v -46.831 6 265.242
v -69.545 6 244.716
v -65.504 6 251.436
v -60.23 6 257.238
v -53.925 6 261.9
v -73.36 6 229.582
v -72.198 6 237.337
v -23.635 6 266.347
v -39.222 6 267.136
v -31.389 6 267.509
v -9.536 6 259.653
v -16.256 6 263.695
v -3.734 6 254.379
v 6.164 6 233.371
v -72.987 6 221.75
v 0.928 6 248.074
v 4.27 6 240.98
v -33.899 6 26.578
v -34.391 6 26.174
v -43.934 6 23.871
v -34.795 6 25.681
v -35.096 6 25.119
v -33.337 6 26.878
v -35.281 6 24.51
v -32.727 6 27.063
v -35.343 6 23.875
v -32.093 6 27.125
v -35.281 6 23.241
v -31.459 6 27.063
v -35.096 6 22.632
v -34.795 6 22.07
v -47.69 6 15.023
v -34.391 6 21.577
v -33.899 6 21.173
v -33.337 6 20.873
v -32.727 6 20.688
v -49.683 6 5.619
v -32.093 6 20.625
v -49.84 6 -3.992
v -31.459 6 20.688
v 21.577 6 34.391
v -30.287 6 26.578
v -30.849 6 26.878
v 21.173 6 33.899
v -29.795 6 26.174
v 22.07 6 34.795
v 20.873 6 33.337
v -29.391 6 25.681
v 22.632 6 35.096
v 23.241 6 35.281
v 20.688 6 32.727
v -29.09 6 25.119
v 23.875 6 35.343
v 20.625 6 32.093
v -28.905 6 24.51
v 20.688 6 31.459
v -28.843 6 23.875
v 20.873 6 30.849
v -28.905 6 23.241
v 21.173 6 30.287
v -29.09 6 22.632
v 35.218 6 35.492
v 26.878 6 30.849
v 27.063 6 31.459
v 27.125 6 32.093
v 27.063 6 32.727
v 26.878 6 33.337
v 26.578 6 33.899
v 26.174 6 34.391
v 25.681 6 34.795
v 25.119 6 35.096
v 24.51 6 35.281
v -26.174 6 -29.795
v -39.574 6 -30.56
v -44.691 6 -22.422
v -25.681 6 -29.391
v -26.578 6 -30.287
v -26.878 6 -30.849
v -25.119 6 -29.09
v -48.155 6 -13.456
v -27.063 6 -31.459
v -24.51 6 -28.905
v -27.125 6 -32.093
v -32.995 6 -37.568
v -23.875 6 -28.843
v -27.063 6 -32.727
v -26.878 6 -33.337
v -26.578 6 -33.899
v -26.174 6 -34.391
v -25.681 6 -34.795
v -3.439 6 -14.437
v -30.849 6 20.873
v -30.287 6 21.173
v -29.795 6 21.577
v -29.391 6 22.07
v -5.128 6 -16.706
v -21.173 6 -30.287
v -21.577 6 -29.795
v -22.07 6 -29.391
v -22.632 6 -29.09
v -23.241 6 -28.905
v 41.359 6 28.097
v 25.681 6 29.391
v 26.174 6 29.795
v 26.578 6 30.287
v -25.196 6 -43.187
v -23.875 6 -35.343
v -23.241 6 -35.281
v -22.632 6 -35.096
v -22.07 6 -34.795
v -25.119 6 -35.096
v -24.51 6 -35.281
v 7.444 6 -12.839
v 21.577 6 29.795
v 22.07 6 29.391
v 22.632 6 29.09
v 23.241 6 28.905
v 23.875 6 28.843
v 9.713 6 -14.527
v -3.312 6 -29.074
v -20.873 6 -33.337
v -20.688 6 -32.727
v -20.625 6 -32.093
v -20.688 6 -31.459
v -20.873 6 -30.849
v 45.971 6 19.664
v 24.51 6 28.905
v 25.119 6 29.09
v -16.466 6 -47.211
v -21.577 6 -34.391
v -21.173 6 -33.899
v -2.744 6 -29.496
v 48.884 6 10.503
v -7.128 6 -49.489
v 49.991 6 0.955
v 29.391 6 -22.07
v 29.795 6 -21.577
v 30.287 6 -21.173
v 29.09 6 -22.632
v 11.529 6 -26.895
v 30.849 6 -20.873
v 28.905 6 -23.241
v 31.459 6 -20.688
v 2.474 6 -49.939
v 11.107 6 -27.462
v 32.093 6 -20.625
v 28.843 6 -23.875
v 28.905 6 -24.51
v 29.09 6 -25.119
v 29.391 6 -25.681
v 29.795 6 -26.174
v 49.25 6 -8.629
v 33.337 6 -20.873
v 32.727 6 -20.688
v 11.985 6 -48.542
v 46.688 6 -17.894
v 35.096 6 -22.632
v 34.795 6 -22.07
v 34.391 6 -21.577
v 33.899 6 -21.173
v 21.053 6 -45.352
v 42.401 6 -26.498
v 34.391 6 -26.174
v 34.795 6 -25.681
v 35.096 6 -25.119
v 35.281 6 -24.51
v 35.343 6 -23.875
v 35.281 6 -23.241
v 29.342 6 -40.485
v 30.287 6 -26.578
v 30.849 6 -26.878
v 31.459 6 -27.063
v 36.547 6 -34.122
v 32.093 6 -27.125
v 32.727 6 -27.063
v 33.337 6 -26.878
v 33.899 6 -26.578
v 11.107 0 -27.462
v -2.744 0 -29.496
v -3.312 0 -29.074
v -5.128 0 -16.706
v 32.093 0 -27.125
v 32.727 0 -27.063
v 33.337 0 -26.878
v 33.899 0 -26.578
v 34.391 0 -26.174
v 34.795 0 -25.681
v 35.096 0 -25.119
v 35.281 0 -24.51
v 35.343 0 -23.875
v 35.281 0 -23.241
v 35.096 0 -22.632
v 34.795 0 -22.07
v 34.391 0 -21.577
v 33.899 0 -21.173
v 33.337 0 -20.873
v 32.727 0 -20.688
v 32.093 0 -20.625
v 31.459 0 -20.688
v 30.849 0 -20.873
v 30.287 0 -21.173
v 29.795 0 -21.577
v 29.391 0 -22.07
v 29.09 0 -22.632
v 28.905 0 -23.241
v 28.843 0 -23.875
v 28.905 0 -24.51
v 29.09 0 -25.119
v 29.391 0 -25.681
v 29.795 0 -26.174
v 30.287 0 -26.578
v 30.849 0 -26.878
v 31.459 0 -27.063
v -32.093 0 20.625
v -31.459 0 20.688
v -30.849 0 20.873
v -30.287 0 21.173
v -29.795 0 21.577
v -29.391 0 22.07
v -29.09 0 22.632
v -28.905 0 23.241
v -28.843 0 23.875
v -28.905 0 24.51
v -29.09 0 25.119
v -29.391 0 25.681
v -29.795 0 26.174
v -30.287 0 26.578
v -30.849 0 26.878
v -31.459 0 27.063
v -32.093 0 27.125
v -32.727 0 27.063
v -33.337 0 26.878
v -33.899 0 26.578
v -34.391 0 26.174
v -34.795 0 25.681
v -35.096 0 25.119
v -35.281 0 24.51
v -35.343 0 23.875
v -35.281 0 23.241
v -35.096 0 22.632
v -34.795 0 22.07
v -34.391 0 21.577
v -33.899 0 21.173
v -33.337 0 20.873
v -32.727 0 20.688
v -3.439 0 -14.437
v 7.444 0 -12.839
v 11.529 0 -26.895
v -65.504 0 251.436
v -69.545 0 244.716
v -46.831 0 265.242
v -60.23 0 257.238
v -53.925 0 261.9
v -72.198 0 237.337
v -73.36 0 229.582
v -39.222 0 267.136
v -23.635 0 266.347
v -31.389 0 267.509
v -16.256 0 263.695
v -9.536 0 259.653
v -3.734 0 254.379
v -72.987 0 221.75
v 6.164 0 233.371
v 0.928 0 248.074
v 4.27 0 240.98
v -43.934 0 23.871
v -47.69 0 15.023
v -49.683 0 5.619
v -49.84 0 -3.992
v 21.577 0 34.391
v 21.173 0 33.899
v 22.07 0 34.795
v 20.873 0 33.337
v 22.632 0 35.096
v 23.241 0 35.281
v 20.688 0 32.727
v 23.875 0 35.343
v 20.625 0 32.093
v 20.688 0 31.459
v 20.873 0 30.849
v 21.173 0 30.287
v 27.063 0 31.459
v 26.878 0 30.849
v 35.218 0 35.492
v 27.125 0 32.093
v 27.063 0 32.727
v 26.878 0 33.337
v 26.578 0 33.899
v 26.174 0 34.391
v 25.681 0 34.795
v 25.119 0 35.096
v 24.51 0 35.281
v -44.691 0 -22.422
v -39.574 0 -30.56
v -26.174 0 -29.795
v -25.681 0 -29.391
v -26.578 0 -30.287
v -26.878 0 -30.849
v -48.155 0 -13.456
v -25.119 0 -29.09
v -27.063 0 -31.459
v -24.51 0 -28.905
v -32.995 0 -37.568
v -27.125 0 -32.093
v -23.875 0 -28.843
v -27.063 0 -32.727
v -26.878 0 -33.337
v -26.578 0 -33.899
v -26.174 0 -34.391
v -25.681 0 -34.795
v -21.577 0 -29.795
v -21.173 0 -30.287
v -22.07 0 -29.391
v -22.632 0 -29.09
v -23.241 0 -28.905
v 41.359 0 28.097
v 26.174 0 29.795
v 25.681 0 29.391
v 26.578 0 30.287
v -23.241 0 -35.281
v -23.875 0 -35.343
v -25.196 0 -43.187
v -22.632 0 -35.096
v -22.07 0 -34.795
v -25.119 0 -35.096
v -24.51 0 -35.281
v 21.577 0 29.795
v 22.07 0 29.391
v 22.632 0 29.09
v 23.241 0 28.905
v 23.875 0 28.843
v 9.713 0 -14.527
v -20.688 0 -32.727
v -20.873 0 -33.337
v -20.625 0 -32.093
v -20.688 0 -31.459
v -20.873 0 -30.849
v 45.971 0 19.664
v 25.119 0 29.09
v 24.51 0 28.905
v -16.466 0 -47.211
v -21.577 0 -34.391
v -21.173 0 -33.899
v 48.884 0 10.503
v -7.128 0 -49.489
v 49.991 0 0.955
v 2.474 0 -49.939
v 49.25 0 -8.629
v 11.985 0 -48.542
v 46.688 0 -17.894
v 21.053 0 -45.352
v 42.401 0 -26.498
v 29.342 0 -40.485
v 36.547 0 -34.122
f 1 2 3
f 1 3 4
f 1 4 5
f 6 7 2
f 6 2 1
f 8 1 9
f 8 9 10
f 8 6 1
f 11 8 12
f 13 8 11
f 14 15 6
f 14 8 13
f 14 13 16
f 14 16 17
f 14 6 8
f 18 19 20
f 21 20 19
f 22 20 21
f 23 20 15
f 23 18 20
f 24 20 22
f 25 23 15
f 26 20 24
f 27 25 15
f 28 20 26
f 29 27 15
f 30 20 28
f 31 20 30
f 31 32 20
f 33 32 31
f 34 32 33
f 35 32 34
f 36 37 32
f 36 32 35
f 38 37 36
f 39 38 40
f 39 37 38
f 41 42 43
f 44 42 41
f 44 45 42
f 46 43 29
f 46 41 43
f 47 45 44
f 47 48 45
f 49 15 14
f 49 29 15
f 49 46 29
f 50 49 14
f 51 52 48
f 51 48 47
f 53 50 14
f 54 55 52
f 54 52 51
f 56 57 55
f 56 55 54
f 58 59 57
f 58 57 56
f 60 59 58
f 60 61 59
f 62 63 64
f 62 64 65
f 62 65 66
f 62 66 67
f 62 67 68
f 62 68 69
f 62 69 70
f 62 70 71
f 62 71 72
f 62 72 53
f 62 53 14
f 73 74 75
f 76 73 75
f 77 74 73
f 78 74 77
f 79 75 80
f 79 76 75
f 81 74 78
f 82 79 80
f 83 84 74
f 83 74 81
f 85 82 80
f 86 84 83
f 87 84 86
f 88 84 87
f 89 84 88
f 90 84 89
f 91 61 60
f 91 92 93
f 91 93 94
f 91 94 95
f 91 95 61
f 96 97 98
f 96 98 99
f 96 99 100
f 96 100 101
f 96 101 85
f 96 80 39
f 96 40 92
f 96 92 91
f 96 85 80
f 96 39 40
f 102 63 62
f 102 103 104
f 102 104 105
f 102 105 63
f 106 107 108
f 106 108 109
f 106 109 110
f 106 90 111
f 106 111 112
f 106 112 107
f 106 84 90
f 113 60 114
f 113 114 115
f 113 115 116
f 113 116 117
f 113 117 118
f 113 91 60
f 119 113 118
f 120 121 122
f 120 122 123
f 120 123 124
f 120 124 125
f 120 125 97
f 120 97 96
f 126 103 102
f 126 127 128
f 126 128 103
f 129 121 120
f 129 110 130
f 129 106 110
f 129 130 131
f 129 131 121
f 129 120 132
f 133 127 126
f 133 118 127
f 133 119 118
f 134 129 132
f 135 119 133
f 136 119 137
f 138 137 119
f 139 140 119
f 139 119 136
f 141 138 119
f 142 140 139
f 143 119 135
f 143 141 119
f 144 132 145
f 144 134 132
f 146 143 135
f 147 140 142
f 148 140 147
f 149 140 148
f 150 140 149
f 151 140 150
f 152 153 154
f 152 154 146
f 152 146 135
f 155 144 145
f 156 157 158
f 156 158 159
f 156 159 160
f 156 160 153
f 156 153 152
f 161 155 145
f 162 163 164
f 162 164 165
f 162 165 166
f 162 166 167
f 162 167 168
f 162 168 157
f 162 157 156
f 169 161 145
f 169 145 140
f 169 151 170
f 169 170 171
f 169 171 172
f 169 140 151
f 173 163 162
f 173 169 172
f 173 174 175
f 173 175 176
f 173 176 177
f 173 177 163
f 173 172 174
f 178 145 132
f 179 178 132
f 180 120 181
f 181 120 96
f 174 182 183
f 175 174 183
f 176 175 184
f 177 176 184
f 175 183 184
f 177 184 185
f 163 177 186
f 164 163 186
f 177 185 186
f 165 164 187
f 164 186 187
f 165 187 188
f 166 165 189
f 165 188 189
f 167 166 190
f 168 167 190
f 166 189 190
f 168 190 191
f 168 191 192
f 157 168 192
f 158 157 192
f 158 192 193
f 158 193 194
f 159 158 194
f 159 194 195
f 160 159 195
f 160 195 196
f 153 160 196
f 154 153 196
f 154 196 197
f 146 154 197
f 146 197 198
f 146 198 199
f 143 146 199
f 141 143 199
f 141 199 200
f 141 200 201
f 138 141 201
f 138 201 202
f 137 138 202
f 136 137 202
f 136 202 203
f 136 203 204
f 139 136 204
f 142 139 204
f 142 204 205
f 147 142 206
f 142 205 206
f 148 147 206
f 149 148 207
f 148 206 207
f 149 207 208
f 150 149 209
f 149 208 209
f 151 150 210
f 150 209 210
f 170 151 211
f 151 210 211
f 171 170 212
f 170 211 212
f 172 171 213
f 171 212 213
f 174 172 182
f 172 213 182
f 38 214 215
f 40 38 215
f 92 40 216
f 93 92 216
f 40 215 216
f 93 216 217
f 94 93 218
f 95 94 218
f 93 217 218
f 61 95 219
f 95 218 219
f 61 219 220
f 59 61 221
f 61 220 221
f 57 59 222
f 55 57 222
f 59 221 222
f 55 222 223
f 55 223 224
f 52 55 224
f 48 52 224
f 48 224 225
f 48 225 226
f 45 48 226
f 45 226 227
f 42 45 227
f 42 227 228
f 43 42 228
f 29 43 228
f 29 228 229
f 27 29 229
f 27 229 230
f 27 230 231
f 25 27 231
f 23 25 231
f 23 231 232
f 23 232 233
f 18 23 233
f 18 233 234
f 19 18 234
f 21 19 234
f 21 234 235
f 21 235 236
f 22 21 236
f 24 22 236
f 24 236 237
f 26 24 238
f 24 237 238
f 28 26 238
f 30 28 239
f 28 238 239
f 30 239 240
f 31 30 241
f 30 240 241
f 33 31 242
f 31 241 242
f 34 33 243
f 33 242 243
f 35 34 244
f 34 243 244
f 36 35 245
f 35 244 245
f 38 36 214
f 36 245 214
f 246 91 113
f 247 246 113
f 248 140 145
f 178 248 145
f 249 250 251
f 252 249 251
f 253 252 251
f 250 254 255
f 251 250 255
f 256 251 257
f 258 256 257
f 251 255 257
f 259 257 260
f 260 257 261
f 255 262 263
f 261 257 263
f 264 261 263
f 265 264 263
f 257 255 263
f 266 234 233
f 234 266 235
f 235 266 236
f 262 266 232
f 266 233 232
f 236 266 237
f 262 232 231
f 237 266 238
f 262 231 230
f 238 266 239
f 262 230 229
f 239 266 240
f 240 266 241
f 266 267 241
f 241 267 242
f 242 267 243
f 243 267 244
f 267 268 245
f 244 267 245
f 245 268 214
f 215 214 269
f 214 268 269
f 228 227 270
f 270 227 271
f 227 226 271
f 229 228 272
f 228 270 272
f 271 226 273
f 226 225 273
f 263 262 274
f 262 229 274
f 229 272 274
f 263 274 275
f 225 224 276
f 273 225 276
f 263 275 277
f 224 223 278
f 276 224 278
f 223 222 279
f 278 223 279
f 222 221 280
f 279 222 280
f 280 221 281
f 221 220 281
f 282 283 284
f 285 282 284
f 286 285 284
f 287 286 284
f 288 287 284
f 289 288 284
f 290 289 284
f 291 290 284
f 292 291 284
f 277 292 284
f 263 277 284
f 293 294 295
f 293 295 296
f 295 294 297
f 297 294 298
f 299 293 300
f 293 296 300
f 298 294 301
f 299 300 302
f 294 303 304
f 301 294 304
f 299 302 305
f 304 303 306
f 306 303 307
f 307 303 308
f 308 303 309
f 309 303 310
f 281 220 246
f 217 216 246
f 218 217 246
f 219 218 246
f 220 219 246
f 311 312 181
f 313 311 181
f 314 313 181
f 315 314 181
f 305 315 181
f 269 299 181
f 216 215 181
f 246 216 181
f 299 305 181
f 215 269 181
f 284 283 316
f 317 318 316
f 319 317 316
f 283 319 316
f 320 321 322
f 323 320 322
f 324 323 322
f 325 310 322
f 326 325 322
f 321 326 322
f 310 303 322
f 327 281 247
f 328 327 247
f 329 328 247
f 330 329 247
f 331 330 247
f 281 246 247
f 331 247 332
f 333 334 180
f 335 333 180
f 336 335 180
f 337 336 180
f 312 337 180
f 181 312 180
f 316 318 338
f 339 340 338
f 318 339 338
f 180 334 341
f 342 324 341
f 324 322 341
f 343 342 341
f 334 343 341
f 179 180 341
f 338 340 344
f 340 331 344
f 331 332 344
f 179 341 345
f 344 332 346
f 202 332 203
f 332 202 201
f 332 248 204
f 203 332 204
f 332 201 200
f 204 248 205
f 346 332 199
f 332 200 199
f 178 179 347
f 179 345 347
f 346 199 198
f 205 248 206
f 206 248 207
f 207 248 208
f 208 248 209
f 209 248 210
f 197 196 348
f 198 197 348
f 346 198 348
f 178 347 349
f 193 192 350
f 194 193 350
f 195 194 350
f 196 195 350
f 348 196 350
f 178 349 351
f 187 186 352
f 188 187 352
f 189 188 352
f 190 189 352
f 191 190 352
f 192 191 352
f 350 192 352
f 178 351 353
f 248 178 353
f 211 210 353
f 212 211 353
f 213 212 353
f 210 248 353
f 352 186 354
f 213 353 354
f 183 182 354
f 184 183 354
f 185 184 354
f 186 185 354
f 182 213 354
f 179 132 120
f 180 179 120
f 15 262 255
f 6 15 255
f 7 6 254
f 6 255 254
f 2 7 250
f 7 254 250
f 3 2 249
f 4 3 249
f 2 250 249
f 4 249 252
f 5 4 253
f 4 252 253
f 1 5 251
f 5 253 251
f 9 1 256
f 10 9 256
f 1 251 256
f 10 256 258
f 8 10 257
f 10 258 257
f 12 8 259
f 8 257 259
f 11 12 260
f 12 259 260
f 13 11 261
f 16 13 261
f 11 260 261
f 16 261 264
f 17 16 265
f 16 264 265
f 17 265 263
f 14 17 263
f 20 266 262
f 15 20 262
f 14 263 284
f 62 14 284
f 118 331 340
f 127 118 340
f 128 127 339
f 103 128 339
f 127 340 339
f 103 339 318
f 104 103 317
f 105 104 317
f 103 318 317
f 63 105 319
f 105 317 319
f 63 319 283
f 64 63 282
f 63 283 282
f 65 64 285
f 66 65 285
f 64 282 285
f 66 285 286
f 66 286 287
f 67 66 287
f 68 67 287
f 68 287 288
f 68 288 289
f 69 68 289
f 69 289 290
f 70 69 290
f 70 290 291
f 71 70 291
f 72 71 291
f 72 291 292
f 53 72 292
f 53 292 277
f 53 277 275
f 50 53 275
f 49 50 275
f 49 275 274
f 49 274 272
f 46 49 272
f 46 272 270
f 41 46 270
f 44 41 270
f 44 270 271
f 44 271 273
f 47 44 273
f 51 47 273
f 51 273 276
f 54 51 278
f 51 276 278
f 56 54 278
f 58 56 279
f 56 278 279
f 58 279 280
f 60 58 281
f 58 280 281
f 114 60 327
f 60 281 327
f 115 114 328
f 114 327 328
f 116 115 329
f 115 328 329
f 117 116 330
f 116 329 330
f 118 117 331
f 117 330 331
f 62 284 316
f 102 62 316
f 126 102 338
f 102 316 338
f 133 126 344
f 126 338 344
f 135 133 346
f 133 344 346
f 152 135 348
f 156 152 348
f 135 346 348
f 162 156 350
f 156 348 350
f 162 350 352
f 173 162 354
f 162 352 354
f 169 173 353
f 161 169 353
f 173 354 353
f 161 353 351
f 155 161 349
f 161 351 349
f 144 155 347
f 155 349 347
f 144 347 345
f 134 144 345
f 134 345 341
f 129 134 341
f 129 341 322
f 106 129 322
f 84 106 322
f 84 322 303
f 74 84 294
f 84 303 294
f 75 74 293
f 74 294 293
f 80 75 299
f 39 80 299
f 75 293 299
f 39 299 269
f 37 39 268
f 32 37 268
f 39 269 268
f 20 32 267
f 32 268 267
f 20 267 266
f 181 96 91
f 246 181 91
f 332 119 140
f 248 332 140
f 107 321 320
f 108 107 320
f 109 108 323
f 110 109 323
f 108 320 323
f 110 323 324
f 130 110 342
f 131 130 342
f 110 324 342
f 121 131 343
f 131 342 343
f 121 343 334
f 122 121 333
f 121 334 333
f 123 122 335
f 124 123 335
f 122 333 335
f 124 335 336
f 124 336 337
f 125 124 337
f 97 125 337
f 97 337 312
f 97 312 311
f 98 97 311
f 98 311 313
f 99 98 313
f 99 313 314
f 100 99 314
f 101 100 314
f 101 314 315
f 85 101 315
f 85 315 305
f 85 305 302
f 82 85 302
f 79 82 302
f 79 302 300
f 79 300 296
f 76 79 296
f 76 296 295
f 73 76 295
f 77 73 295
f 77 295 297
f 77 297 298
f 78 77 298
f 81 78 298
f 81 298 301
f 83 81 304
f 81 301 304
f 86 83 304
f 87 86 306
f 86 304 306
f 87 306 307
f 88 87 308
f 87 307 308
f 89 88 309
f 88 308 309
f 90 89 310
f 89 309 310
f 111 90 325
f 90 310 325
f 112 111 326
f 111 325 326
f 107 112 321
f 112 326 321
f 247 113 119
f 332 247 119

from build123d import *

# Parameters (mm, degrees)
EXTRUDE_1_DEPTH      = 6
SKETCH_6_R           = 3.25
CUT_EXTRUDE_3_DEPTH  = 28
CUT_EXTRUDE_11_DEPTH = 35


with BuildPart() as part:
    # 草图1 → 凸台-拉伸1 (new body)
    with BuildSketch(Plane(origin=(0, 0, 0), x_dir=(1, 0, 0), z_dir=(0, 1, 0))):
        with BuildLine():
            Line((-43.933694981, -23.871121576), (-72.986973894, -221.749637298))
            ThreePointArc((-72.986973894, -221.749637298), (-39.221926532, -267.135996225), (6.164432395, -233.370948863))
            Line((6.164432395, -233.370948863), (35.217711308, -35.492433141))
            ThreePointArc((35.217711308, -35.492433141), (7.263319728, 49.469628931), (-43.933694981, -23.871121576))
        make_face()
    extrude(amount=EXTRUDE_1_DEPTH)

    # 草图6 → 切除-拉伸3 (cut)
    with BuildSketch(Plane.XZ):
        with Locations(Location((-32.093002168, 23.87549396, 0), (0, 0, 270))):
            Circle(SKETCH_6_R)
        with Locations(Location((23.87549396, 32.093002168, 0), (0, 0, 270))):
            Circle(SKETCH_6_R)
        with Locations(Location((32.093002168, -23.87549396, 0), (0, 0, 270))):
            Circle(SKETCH_6_R)
        with Locations(Location((-23.87549396, -32.093002168, 0), (0, 0, 270))):
            Circle(SKETCH_6_R)
    extrude(amount=-CUT_EXTRUDE_3_DEPTH, mode=Mode.SUBTRACT)

    # 草图11 → 切除-拉伸11 (cut)
    with BuildSketch(Plane(origin=(0, 6, 0), x_dir=(1, 0, 0), z_dir=(0, 1, 0))):
        Polygon((9.713368511, 14.527342871), (11.529198442, 26.894750104), (11.10713535, 27.462079591), (-2.744360751, 29.495809113), (-3.311690238, 29.073746021), (-5.127520168, 16.706338788), (-3.4392678, 14.437020842), (7.444050565, 12.839090503), align=None)
    extrude(amount=-CUT_EXTRUDE_11_DEPTH, mode=Mode.SUBTRACT)


solid = part.part
